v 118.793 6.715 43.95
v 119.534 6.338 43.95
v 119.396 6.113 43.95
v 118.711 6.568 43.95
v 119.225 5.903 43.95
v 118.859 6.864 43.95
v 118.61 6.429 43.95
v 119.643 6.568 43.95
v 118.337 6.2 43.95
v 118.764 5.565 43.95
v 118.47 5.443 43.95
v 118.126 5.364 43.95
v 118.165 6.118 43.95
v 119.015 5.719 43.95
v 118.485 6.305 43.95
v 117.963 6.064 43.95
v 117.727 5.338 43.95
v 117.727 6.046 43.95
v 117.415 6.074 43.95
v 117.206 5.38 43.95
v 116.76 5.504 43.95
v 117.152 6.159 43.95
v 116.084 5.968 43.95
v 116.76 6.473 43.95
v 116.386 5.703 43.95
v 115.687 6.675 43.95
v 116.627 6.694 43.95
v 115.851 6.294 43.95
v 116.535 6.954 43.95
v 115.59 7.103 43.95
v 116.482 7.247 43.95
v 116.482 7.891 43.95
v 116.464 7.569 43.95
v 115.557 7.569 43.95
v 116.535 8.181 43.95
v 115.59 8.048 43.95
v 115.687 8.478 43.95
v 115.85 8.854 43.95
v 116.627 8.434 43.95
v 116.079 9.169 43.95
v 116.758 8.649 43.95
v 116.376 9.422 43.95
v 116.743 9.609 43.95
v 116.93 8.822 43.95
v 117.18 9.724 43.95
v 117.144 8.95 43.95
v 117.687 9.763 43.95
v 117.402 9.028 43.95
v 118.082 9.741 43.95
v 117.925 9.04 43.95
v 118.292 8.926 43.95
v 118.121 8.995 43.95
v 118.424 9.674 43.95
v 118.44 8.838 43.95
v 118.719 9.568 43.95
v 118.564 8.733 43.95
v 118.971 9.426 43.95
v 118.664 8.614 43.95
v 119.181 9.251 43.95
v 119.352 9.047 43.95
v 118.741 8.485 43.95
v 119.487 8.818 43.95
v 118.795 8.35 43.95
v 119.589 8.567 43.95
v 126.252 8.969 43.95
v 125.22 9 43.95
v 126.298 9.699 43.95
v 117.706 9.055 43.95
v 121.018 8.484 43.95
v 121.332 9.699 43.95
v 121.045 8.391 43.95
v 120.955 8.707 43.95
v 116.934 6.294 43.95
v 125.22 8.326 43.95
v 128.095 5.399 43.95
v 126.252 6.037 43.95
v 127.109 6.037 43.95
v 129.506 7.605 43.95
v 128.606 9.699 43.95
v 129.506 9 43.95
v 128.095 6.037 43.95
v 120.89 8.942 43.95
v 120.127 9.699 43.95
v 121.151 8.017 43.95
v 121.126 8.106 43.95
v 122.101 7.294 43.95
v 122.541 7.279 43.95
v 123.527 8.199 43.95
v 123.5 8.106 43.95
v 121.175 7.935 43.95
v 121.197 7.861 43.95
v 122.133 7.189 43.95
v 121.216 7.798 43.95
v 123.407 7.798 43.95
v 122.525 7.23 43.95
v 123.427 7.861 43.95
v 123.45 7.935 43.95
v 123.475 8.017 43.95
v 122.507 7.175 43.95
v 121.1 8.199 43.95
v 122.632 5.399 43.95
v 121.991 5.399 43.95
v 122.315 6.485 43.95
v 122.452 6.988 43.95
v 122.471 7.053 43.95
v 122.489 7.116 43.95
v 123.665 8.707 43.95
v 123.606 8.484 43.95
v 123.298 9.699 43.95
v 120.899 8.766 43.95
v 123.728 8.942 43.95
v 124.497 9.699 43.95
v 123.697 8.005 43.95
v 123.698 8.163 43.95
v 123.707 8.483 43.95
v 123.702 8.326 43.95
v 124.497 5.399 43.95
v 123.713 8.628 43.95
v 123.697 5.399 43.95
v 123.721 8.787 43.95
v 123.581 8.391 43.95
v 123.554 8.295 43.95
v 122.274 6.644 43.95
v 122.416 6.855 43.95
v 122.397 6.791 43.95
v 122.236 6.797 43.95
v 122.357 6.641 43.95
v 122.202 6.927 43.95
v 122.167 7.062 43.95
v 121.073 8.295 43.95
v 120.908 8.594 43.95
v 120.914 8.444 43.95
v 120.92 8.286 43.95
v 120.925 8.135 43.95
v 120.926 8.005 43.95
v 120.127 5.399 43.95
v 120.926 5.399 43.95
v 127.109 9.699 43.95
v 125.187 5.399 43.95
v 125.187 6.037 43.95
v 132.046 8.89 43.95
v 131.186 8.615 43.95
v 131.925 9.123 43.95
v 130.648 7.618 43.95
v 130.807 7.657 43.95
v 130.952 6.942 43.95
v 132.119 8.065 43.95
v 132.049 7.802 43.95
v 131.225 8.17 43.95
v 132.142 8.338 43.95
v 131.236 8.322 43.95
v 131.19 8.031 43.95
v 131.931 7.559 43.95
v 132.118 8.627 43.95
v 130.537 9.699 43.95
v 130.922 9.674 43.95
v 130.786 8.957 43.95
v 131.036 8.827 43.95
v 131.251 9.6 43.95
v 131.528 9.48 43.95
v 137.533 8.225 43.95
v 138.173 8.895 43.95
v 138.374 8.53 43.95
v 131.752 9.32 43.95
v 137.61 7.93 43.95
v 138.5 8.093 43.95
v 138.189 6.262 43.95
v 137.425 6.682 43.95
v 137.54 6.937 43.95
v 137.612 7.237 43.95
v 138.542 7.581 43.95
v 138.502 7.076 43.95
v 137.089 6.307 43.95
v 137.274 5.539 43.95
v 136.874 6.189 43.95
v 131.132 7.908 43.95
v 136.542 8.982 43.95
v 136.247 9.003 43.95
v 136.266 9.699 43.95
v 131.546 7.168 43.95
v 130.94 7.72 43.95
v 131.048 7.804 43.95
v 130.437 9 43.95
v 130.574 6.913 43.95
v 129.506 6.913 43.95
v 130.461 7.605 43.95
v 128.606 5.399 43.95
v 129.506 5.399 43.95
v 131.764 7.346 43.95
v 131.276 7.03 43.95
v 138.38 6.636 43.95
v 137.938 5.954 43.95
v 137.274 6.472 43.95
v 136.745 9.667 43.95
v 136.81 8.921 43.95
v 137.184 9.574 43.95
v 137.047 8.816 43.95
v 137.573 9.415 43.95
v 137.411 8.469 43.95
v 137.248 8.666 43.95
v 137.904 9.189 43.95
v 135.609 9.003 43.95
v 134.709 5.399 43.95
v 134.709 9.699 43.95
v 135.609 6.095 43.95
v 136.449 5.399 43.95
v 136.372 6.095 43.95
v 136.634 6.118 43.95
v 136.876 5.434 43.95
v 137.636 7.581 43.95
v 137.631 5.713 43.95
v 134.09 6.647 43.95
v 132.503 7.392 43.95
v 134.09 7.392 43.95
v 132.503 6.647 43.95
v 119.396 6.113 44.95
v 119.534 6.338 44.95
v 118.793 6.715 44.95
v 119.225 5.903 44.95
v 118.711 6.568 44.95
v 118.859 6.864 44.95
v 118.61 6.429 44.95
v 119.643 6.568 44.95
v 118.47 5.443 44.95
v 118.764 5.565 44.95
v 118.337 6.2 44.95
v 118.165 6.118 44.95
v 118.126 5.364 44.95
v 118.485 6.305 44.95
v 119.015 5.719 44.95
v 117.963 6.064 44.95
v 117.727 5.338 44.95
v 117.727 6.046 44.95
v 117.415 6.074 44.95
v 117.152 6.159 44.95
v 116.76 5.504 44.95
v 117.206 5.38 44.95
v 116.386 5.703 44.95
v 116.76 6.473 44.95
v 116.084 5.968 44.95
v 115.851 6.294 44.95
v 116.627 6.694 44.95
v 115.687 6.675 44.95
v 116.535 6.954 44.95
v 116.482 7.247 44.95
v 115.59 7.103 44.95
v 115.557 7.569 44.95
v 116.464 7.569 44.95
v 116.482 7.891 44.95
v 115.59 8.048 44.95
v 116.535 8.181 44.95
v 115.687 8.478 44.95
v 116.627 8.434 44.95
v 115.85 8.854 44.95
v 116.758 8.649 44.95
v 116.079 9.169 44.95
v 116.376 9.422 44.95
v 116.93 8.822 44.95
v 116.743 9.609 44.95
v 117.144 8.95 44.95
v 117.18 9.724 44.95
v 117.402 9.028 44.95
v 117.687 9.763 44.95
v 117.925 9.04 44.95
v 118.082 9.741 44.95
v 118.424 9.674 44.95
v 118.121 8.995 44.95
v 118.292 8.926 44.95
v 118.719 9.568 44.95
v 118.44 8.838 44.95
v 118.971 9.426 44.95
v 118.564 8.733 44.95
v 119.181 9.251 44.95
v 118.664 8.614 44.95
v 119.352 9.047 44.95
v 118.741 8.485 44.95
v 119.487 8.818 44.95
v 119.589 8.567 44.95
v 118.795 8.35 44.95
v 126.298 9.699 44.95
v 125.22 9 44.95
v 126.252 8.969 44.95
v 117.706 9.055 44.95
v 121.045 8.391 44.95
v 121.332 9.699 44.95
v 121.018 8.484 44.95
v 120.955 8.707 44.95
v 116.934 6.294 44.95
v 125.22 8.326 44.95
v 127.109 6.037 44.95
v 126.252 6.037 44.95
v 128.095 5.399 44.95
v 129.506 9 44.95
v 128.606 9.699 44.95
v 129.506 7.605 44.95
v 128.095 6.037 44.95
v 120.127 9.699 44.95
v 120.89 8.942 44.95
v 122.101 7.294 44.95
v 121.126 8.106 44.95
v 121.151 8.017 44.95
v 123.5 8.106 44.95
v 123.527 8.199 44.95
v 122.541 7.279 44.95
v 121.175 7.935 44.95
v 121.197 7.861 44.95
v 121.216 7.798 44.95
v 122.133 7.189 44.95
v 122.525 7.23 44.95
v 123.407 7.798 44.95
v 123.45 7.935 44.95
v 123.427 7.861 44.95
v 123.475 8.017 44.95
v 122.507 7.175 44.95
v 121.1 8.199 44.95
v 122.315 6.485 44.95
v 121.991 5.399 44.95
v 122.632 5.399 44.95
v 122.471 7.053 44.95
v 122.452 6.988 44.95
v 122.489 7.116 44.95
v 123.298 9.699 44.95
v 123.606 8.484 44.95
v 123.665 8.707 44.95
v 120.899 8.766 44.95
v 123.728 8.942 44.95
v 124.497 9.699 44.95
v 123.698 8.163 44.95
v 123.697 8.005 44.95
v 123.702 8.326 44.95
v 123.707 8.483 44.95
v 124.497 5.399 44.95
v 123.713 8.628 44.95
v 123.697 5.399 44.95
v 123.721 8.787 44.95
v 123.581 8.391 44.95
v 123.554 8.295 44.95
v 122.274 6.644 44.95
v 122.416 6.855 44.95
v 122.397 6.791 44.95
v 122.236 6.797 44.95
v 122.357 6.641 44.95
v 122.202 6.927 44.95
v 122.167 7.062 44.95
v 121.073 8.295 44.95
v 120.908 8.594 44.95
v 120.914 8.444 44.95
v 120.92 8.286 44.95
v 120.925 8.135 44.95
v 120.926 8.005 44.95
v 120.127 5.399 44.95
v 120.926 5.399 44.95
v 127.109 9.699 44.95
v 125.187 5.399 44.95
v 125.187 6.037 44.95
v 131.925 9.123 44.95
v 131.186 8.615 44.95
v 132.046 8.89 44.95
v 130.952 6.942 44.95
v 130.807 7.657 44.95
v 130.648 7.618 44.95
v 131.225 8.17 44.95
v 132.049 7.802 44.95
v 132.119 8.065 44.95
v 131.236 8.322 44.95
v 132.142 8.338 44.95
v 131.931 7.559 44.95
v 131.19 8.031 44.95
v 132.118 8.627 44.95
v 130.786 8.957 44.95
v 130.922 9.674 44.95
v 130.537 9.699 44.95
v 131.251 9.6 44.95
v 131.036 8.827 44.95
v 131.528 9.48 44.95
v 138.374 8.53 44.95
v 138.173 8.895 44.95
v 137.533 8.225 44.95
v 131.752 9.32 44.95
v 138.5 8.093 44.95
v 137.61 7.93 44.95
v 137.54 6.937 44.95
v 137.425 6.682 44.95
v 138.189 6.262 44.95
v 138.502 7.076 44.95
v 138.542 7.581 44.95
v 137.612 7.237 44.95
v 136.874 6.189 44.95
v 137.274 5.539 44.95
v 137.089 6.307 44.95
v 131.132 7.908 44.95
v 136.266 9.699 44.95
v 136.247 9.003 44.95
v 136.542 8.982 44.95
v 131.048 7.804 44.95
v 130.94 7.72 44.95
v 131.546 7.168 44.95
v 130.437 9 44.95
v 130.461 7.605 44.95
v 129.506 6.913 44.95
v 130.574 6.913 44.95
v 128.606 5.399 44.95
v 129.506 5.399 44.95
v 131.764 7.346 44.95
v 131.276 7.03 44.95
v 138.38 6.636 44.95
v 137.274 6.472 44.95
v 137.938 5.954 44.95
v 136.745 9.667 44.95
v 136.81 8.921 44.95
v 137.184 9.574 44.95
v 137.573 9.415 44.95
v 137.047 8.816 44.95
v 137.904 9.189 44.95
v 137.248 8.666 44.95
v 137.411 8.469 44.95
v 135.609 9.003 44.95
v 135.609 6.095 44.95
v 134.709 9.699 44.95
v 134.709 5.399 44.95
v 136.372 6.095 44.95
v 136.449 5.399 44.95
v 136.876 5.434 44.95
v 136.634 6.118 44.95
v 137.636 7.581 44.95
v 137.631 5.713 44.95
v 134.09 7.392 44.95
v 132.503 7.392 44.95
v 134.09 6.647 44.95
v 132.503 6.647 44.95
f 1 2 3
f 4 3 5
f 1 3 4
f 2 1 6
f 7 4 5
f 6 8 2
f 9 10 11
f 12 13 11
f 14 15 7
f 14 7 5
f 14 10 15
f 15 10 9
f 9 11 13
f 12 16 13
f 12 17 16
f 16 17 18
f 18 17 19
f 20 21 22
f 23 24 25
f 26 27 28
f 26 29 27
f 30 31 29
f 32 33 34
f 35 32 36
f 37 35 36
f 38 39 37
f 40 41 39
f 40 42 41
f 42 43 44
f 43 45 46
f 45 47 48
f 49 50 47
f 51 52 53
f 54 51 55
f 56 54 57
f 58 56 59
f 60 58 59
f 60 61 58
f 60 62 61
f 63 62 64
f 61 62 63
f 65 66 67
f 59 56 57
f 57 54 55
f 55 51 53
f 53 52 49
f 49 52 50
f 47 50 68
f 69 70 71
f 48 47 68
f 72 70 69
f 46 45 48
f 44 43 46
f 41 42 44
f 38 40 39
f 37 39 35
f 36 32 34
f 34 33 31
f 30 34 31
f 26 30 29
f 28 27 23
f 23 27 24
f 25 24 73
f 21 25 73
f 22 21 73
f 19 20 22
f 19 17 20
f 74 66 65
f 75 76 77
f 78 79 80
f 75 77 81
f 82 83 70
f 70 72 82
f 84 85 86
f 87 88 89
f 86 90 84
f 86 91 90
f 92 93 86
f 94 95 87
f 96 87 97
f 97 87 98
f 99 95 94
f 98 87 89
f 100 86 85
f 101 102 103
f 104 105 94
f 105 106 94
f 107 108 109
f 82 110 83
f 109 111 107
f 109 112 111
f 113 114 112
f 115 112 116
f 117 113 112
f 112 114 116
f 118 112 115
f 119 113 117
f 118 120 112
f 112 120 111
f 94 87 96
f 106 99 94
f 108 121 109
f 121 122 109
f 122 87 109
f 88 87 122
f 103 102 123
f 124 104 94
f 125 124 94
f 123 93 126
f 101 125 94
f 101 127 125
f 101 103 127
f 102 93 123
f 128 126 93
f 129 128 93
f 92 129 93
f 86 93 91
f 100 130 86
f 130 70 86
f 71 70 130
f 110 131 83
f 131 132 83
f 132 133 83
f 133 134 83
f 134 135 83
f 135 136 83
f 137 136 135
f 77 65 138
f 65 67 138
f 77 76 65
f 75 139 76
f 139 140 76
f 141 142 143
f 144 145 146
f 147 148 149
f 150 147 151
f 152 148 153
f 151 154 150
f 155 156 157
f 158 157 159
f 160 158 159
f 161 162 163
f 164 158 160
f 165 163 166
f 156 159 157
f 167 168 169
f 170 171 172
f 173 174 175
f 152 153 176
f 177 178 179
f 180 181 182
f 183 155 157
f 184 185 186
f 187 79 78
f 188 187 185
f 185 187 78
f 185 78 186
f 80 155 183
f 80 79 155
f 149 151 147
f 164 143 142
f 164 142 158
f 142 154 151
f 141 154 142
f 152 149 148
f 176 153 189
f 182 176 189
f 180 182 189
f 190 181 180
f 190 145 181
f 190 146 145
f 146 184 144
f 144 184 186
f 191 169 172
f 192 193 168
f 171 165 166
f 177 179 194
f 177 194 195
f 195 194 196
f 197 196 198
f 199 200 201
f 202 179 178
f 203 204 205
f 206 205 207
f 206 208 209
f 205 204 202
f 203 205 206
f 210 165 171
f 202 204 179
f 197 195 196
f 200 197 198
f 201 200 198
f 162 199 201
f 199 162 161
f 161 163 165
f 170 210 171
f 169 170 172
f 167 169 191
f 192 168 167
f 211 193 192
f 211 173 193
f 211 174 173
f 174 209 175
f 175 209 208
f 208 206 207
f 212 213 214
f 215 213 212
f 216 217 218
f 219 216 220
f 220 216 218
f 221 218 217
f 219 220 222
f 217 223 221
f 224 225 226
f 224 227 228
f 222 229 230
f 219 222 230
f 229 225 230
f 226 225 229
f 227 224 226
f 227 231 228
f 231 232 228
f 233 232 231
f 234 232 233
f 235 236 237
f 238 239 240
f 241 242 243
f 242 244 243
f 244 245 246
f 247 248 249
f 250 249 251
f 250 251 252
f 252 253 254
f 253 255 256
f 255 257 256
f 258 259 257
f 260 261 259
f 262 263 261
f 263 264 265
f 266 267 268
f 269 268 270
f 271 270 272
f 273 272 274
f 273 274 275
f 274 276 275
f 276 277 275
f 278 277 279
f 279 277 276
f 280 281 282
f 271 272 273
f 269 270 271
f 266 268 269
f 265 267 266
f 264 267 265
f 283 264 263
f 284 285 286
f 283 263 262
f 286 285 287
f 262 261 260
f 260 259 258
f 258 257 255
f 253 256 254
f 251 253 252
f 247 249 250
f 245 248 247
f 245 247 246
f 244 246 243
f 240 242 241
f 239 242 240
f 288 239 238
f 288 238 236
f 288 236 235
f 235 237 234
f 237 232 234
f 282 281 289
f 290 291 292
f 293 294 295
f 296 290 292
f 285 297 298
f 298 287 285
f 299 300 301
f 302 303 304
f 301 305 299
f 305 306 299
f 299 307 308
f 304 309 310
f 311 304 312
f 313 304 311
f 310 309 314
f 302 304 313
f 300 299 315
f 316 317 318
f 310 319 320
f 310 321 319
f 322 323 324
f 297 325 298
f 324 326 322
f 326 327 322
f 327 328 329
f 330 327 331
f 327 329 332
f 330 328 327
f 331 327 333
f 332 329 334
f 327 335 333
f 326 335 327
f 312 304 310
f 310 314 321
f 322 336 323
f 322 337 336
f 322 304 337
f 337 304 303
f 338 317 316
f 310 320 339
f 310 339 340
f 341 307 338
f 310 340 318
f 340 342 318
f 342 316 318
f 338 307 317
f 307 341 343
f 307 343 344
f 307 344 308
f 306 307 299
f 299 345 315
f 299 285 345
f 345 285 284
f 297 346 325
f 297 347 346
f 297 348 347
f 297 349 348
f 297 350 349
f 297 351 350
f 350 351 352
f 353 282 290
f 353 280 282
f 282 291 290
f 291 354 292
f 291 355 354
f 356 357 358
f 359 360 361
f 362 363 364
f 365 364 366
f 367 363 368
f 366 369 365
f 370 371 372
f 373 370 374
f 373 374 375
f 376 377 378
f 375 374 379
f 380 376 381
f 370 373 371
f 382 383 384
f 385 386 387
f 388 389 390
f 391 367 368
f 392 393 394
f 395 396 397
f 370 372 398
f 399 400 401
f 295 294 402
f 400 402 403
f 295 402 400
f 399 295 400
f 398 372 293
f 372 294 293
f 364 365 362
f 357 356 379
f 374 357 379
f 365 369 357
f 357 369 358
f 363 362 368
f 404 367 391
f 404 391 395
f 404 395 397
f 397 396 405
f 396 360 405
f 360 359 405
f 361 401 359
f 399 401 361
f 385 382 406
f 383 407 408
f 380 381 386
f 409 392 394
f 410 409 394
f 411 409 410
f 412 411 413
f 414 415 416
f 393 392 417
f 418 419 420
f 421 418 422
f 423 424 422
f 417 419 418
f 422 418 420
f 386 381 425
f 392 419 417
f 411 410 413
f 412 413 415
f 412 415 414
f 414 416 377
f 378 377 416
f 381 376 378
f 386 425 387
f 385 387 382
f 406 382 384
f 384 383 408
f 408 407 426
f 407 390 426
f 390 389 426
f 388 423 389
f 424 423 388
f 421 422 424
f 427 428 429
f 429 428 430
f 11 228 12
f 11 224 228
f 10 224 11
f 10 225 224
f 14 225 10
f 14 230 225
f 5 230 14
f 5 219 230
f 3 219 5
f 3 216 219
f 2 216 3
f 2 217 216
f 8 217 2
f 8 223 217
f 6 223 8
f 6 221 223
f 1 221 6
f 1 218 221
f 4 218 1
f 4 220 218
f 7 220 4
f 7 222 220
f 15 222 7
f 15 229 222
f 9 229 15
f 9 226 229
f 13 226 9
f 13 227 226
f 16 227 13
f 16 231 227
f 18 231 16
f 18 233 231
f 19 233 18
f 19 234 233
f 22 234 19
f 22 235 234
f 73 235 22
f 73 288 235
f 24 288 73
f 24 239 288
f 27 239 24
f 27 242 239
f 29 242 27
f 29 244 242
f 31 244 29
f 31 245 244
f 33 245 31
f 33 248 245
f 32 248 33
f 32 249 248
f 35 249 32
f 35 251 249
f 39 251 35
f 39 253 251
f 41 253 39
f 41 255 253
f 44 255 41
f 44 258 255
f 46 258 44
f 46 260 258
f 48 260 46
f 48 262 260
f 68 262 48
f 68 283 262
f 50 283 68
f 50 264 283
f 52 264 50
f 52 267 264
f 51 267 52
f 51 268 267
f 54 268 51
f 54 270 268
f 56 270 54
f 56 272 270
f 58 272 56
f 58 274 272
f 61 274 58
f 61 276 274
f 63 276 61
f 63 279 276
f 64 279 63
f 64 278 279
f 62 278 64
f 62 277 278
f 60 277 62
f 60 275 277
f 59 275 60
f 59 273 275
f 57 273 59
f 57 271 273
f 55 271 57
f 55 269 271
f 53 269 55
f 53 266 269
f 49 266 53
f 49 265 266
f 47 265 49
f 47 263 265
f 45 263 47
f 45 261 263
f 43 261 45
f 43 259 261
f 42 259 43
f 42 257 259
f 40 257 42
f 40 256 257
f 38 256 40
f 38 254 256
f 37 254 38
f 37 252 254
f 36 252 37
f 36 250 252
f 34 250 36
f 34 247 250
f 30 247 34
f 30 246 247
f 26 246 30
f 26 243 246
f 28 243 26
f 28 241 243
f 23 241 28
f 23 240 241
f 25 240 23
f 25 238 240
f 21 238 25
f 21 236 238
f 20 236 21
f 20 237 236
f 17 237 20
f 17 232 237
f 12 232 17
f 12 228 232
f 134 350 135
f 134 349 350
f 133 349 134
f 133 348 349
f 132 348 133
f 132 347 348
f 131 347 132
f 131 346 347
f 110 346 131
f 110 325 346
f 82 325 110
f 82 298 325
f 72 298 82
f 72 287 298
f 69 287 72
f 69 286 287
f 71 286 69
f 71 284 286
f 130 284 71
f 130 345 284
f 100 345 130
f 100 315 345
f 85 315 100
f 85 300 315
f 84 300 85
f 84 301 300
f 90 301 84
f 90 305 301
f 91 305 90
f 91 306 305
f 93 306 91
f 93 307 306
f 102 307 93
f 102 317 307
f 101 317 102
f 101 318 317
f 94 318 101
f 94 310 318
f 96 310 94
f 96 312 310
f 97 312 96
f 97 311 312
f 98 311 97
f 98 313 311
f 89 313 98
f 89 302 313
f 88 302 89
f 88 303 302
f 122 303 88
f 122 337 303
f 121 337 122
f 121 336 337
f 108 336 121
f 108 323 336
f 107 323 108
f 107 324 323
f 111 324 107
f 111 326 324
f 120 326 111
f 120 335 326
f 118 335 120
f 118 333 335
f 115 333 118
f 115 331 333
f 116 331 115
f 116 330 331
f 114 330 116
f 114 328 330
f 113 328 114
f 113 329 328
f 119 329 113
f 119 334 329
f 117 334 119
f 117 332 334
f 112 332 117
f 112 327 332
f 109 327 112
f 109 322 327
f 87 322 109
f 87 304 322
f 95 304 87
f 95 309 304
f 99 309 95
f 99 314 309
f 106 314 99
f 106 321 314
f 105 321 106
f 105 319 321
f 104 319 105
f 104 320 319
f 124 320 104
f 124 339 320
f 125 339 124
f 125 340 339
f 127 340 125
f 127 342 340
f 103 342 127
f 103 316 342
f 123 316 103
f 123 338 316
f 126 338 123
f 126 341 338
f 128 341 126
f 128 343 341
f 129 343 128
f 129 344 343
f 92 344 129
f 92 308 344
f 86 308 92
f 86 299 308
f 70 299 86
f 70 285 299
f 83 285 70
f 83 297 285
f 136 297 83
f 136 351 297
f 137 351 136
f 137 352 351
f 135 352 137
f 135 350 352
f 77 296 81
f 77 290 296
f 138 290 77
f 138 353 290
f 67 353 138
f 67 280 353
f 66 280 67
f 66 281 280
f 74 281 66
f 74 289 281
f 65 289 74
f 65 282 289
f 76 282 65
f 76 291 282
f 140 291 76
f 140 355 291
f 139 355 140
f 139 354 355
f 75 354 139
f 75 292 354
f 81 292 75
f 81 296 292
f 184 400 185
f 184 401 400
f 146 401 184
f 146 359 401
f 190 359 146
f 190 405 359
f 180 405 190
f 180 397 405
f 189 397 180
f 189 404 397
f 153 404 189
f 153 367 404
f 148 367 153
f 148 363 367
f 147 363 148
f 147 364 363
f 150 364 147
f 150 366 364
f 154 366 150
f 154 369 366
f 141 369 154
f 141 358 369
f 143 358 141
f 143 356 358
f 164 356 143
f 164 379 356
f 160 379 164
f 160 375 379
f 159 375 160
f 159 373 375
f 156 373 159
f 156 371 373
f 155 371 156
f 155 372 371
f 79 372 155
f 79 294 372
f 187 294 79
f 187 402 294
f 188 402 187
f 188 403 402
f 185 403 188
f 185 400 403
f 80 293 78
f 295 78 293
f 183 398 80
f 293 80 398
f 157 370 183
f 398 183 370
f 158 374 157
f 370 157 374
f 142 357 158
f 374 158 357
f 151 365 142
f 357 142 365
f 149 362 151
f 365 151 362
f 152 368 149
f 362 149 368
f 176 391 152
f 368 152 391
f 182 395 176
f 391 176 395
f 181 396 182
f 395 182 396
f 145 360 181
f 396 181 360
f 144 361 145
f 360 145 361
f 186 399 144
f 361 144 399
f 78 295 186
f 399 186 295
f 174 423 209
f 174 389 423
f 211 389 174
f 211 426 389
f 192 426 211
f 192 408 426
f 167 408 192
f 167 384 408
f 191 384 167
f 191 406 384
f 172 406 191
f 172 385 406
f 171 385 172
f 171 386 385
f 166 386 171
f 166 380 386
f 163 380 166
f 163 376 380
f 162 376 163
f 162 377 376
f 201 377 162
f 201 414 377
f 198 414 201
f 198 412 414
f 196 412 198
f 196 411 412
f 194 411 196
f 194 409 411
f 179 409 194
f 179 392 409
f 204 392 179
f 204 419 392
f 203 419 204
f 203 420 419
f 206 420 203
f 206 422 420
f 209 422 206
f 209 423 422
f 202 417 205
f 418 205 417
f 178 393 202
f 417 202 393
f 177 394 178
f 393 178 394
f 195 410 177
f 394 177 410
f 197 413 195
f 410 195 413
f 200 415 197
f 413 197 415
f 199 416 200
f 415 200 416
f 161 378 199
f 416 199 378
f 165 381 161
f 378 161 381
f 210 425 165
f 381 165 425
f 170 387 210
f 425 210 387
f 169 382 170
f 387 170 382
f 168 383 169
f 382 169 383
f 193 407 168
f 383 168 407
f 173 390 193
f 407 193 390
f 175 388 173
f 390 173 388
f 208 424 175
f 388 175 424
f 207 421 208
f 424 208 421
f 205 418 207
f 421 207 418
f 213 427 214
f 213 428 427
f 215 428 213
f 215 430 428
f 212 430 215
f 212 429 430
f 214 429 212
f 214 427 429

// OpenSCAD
// CM1P-D ID text, engraved 0.5 into the plate's top face (frame as cm1p_a_freecad.py).
translate([127, 7.5, 43.95]) linear_extrude(1) text("CM1P-D", size = 4.5, font = "Liberation Sans:style=Bold", halign = "center", valign = "center");
